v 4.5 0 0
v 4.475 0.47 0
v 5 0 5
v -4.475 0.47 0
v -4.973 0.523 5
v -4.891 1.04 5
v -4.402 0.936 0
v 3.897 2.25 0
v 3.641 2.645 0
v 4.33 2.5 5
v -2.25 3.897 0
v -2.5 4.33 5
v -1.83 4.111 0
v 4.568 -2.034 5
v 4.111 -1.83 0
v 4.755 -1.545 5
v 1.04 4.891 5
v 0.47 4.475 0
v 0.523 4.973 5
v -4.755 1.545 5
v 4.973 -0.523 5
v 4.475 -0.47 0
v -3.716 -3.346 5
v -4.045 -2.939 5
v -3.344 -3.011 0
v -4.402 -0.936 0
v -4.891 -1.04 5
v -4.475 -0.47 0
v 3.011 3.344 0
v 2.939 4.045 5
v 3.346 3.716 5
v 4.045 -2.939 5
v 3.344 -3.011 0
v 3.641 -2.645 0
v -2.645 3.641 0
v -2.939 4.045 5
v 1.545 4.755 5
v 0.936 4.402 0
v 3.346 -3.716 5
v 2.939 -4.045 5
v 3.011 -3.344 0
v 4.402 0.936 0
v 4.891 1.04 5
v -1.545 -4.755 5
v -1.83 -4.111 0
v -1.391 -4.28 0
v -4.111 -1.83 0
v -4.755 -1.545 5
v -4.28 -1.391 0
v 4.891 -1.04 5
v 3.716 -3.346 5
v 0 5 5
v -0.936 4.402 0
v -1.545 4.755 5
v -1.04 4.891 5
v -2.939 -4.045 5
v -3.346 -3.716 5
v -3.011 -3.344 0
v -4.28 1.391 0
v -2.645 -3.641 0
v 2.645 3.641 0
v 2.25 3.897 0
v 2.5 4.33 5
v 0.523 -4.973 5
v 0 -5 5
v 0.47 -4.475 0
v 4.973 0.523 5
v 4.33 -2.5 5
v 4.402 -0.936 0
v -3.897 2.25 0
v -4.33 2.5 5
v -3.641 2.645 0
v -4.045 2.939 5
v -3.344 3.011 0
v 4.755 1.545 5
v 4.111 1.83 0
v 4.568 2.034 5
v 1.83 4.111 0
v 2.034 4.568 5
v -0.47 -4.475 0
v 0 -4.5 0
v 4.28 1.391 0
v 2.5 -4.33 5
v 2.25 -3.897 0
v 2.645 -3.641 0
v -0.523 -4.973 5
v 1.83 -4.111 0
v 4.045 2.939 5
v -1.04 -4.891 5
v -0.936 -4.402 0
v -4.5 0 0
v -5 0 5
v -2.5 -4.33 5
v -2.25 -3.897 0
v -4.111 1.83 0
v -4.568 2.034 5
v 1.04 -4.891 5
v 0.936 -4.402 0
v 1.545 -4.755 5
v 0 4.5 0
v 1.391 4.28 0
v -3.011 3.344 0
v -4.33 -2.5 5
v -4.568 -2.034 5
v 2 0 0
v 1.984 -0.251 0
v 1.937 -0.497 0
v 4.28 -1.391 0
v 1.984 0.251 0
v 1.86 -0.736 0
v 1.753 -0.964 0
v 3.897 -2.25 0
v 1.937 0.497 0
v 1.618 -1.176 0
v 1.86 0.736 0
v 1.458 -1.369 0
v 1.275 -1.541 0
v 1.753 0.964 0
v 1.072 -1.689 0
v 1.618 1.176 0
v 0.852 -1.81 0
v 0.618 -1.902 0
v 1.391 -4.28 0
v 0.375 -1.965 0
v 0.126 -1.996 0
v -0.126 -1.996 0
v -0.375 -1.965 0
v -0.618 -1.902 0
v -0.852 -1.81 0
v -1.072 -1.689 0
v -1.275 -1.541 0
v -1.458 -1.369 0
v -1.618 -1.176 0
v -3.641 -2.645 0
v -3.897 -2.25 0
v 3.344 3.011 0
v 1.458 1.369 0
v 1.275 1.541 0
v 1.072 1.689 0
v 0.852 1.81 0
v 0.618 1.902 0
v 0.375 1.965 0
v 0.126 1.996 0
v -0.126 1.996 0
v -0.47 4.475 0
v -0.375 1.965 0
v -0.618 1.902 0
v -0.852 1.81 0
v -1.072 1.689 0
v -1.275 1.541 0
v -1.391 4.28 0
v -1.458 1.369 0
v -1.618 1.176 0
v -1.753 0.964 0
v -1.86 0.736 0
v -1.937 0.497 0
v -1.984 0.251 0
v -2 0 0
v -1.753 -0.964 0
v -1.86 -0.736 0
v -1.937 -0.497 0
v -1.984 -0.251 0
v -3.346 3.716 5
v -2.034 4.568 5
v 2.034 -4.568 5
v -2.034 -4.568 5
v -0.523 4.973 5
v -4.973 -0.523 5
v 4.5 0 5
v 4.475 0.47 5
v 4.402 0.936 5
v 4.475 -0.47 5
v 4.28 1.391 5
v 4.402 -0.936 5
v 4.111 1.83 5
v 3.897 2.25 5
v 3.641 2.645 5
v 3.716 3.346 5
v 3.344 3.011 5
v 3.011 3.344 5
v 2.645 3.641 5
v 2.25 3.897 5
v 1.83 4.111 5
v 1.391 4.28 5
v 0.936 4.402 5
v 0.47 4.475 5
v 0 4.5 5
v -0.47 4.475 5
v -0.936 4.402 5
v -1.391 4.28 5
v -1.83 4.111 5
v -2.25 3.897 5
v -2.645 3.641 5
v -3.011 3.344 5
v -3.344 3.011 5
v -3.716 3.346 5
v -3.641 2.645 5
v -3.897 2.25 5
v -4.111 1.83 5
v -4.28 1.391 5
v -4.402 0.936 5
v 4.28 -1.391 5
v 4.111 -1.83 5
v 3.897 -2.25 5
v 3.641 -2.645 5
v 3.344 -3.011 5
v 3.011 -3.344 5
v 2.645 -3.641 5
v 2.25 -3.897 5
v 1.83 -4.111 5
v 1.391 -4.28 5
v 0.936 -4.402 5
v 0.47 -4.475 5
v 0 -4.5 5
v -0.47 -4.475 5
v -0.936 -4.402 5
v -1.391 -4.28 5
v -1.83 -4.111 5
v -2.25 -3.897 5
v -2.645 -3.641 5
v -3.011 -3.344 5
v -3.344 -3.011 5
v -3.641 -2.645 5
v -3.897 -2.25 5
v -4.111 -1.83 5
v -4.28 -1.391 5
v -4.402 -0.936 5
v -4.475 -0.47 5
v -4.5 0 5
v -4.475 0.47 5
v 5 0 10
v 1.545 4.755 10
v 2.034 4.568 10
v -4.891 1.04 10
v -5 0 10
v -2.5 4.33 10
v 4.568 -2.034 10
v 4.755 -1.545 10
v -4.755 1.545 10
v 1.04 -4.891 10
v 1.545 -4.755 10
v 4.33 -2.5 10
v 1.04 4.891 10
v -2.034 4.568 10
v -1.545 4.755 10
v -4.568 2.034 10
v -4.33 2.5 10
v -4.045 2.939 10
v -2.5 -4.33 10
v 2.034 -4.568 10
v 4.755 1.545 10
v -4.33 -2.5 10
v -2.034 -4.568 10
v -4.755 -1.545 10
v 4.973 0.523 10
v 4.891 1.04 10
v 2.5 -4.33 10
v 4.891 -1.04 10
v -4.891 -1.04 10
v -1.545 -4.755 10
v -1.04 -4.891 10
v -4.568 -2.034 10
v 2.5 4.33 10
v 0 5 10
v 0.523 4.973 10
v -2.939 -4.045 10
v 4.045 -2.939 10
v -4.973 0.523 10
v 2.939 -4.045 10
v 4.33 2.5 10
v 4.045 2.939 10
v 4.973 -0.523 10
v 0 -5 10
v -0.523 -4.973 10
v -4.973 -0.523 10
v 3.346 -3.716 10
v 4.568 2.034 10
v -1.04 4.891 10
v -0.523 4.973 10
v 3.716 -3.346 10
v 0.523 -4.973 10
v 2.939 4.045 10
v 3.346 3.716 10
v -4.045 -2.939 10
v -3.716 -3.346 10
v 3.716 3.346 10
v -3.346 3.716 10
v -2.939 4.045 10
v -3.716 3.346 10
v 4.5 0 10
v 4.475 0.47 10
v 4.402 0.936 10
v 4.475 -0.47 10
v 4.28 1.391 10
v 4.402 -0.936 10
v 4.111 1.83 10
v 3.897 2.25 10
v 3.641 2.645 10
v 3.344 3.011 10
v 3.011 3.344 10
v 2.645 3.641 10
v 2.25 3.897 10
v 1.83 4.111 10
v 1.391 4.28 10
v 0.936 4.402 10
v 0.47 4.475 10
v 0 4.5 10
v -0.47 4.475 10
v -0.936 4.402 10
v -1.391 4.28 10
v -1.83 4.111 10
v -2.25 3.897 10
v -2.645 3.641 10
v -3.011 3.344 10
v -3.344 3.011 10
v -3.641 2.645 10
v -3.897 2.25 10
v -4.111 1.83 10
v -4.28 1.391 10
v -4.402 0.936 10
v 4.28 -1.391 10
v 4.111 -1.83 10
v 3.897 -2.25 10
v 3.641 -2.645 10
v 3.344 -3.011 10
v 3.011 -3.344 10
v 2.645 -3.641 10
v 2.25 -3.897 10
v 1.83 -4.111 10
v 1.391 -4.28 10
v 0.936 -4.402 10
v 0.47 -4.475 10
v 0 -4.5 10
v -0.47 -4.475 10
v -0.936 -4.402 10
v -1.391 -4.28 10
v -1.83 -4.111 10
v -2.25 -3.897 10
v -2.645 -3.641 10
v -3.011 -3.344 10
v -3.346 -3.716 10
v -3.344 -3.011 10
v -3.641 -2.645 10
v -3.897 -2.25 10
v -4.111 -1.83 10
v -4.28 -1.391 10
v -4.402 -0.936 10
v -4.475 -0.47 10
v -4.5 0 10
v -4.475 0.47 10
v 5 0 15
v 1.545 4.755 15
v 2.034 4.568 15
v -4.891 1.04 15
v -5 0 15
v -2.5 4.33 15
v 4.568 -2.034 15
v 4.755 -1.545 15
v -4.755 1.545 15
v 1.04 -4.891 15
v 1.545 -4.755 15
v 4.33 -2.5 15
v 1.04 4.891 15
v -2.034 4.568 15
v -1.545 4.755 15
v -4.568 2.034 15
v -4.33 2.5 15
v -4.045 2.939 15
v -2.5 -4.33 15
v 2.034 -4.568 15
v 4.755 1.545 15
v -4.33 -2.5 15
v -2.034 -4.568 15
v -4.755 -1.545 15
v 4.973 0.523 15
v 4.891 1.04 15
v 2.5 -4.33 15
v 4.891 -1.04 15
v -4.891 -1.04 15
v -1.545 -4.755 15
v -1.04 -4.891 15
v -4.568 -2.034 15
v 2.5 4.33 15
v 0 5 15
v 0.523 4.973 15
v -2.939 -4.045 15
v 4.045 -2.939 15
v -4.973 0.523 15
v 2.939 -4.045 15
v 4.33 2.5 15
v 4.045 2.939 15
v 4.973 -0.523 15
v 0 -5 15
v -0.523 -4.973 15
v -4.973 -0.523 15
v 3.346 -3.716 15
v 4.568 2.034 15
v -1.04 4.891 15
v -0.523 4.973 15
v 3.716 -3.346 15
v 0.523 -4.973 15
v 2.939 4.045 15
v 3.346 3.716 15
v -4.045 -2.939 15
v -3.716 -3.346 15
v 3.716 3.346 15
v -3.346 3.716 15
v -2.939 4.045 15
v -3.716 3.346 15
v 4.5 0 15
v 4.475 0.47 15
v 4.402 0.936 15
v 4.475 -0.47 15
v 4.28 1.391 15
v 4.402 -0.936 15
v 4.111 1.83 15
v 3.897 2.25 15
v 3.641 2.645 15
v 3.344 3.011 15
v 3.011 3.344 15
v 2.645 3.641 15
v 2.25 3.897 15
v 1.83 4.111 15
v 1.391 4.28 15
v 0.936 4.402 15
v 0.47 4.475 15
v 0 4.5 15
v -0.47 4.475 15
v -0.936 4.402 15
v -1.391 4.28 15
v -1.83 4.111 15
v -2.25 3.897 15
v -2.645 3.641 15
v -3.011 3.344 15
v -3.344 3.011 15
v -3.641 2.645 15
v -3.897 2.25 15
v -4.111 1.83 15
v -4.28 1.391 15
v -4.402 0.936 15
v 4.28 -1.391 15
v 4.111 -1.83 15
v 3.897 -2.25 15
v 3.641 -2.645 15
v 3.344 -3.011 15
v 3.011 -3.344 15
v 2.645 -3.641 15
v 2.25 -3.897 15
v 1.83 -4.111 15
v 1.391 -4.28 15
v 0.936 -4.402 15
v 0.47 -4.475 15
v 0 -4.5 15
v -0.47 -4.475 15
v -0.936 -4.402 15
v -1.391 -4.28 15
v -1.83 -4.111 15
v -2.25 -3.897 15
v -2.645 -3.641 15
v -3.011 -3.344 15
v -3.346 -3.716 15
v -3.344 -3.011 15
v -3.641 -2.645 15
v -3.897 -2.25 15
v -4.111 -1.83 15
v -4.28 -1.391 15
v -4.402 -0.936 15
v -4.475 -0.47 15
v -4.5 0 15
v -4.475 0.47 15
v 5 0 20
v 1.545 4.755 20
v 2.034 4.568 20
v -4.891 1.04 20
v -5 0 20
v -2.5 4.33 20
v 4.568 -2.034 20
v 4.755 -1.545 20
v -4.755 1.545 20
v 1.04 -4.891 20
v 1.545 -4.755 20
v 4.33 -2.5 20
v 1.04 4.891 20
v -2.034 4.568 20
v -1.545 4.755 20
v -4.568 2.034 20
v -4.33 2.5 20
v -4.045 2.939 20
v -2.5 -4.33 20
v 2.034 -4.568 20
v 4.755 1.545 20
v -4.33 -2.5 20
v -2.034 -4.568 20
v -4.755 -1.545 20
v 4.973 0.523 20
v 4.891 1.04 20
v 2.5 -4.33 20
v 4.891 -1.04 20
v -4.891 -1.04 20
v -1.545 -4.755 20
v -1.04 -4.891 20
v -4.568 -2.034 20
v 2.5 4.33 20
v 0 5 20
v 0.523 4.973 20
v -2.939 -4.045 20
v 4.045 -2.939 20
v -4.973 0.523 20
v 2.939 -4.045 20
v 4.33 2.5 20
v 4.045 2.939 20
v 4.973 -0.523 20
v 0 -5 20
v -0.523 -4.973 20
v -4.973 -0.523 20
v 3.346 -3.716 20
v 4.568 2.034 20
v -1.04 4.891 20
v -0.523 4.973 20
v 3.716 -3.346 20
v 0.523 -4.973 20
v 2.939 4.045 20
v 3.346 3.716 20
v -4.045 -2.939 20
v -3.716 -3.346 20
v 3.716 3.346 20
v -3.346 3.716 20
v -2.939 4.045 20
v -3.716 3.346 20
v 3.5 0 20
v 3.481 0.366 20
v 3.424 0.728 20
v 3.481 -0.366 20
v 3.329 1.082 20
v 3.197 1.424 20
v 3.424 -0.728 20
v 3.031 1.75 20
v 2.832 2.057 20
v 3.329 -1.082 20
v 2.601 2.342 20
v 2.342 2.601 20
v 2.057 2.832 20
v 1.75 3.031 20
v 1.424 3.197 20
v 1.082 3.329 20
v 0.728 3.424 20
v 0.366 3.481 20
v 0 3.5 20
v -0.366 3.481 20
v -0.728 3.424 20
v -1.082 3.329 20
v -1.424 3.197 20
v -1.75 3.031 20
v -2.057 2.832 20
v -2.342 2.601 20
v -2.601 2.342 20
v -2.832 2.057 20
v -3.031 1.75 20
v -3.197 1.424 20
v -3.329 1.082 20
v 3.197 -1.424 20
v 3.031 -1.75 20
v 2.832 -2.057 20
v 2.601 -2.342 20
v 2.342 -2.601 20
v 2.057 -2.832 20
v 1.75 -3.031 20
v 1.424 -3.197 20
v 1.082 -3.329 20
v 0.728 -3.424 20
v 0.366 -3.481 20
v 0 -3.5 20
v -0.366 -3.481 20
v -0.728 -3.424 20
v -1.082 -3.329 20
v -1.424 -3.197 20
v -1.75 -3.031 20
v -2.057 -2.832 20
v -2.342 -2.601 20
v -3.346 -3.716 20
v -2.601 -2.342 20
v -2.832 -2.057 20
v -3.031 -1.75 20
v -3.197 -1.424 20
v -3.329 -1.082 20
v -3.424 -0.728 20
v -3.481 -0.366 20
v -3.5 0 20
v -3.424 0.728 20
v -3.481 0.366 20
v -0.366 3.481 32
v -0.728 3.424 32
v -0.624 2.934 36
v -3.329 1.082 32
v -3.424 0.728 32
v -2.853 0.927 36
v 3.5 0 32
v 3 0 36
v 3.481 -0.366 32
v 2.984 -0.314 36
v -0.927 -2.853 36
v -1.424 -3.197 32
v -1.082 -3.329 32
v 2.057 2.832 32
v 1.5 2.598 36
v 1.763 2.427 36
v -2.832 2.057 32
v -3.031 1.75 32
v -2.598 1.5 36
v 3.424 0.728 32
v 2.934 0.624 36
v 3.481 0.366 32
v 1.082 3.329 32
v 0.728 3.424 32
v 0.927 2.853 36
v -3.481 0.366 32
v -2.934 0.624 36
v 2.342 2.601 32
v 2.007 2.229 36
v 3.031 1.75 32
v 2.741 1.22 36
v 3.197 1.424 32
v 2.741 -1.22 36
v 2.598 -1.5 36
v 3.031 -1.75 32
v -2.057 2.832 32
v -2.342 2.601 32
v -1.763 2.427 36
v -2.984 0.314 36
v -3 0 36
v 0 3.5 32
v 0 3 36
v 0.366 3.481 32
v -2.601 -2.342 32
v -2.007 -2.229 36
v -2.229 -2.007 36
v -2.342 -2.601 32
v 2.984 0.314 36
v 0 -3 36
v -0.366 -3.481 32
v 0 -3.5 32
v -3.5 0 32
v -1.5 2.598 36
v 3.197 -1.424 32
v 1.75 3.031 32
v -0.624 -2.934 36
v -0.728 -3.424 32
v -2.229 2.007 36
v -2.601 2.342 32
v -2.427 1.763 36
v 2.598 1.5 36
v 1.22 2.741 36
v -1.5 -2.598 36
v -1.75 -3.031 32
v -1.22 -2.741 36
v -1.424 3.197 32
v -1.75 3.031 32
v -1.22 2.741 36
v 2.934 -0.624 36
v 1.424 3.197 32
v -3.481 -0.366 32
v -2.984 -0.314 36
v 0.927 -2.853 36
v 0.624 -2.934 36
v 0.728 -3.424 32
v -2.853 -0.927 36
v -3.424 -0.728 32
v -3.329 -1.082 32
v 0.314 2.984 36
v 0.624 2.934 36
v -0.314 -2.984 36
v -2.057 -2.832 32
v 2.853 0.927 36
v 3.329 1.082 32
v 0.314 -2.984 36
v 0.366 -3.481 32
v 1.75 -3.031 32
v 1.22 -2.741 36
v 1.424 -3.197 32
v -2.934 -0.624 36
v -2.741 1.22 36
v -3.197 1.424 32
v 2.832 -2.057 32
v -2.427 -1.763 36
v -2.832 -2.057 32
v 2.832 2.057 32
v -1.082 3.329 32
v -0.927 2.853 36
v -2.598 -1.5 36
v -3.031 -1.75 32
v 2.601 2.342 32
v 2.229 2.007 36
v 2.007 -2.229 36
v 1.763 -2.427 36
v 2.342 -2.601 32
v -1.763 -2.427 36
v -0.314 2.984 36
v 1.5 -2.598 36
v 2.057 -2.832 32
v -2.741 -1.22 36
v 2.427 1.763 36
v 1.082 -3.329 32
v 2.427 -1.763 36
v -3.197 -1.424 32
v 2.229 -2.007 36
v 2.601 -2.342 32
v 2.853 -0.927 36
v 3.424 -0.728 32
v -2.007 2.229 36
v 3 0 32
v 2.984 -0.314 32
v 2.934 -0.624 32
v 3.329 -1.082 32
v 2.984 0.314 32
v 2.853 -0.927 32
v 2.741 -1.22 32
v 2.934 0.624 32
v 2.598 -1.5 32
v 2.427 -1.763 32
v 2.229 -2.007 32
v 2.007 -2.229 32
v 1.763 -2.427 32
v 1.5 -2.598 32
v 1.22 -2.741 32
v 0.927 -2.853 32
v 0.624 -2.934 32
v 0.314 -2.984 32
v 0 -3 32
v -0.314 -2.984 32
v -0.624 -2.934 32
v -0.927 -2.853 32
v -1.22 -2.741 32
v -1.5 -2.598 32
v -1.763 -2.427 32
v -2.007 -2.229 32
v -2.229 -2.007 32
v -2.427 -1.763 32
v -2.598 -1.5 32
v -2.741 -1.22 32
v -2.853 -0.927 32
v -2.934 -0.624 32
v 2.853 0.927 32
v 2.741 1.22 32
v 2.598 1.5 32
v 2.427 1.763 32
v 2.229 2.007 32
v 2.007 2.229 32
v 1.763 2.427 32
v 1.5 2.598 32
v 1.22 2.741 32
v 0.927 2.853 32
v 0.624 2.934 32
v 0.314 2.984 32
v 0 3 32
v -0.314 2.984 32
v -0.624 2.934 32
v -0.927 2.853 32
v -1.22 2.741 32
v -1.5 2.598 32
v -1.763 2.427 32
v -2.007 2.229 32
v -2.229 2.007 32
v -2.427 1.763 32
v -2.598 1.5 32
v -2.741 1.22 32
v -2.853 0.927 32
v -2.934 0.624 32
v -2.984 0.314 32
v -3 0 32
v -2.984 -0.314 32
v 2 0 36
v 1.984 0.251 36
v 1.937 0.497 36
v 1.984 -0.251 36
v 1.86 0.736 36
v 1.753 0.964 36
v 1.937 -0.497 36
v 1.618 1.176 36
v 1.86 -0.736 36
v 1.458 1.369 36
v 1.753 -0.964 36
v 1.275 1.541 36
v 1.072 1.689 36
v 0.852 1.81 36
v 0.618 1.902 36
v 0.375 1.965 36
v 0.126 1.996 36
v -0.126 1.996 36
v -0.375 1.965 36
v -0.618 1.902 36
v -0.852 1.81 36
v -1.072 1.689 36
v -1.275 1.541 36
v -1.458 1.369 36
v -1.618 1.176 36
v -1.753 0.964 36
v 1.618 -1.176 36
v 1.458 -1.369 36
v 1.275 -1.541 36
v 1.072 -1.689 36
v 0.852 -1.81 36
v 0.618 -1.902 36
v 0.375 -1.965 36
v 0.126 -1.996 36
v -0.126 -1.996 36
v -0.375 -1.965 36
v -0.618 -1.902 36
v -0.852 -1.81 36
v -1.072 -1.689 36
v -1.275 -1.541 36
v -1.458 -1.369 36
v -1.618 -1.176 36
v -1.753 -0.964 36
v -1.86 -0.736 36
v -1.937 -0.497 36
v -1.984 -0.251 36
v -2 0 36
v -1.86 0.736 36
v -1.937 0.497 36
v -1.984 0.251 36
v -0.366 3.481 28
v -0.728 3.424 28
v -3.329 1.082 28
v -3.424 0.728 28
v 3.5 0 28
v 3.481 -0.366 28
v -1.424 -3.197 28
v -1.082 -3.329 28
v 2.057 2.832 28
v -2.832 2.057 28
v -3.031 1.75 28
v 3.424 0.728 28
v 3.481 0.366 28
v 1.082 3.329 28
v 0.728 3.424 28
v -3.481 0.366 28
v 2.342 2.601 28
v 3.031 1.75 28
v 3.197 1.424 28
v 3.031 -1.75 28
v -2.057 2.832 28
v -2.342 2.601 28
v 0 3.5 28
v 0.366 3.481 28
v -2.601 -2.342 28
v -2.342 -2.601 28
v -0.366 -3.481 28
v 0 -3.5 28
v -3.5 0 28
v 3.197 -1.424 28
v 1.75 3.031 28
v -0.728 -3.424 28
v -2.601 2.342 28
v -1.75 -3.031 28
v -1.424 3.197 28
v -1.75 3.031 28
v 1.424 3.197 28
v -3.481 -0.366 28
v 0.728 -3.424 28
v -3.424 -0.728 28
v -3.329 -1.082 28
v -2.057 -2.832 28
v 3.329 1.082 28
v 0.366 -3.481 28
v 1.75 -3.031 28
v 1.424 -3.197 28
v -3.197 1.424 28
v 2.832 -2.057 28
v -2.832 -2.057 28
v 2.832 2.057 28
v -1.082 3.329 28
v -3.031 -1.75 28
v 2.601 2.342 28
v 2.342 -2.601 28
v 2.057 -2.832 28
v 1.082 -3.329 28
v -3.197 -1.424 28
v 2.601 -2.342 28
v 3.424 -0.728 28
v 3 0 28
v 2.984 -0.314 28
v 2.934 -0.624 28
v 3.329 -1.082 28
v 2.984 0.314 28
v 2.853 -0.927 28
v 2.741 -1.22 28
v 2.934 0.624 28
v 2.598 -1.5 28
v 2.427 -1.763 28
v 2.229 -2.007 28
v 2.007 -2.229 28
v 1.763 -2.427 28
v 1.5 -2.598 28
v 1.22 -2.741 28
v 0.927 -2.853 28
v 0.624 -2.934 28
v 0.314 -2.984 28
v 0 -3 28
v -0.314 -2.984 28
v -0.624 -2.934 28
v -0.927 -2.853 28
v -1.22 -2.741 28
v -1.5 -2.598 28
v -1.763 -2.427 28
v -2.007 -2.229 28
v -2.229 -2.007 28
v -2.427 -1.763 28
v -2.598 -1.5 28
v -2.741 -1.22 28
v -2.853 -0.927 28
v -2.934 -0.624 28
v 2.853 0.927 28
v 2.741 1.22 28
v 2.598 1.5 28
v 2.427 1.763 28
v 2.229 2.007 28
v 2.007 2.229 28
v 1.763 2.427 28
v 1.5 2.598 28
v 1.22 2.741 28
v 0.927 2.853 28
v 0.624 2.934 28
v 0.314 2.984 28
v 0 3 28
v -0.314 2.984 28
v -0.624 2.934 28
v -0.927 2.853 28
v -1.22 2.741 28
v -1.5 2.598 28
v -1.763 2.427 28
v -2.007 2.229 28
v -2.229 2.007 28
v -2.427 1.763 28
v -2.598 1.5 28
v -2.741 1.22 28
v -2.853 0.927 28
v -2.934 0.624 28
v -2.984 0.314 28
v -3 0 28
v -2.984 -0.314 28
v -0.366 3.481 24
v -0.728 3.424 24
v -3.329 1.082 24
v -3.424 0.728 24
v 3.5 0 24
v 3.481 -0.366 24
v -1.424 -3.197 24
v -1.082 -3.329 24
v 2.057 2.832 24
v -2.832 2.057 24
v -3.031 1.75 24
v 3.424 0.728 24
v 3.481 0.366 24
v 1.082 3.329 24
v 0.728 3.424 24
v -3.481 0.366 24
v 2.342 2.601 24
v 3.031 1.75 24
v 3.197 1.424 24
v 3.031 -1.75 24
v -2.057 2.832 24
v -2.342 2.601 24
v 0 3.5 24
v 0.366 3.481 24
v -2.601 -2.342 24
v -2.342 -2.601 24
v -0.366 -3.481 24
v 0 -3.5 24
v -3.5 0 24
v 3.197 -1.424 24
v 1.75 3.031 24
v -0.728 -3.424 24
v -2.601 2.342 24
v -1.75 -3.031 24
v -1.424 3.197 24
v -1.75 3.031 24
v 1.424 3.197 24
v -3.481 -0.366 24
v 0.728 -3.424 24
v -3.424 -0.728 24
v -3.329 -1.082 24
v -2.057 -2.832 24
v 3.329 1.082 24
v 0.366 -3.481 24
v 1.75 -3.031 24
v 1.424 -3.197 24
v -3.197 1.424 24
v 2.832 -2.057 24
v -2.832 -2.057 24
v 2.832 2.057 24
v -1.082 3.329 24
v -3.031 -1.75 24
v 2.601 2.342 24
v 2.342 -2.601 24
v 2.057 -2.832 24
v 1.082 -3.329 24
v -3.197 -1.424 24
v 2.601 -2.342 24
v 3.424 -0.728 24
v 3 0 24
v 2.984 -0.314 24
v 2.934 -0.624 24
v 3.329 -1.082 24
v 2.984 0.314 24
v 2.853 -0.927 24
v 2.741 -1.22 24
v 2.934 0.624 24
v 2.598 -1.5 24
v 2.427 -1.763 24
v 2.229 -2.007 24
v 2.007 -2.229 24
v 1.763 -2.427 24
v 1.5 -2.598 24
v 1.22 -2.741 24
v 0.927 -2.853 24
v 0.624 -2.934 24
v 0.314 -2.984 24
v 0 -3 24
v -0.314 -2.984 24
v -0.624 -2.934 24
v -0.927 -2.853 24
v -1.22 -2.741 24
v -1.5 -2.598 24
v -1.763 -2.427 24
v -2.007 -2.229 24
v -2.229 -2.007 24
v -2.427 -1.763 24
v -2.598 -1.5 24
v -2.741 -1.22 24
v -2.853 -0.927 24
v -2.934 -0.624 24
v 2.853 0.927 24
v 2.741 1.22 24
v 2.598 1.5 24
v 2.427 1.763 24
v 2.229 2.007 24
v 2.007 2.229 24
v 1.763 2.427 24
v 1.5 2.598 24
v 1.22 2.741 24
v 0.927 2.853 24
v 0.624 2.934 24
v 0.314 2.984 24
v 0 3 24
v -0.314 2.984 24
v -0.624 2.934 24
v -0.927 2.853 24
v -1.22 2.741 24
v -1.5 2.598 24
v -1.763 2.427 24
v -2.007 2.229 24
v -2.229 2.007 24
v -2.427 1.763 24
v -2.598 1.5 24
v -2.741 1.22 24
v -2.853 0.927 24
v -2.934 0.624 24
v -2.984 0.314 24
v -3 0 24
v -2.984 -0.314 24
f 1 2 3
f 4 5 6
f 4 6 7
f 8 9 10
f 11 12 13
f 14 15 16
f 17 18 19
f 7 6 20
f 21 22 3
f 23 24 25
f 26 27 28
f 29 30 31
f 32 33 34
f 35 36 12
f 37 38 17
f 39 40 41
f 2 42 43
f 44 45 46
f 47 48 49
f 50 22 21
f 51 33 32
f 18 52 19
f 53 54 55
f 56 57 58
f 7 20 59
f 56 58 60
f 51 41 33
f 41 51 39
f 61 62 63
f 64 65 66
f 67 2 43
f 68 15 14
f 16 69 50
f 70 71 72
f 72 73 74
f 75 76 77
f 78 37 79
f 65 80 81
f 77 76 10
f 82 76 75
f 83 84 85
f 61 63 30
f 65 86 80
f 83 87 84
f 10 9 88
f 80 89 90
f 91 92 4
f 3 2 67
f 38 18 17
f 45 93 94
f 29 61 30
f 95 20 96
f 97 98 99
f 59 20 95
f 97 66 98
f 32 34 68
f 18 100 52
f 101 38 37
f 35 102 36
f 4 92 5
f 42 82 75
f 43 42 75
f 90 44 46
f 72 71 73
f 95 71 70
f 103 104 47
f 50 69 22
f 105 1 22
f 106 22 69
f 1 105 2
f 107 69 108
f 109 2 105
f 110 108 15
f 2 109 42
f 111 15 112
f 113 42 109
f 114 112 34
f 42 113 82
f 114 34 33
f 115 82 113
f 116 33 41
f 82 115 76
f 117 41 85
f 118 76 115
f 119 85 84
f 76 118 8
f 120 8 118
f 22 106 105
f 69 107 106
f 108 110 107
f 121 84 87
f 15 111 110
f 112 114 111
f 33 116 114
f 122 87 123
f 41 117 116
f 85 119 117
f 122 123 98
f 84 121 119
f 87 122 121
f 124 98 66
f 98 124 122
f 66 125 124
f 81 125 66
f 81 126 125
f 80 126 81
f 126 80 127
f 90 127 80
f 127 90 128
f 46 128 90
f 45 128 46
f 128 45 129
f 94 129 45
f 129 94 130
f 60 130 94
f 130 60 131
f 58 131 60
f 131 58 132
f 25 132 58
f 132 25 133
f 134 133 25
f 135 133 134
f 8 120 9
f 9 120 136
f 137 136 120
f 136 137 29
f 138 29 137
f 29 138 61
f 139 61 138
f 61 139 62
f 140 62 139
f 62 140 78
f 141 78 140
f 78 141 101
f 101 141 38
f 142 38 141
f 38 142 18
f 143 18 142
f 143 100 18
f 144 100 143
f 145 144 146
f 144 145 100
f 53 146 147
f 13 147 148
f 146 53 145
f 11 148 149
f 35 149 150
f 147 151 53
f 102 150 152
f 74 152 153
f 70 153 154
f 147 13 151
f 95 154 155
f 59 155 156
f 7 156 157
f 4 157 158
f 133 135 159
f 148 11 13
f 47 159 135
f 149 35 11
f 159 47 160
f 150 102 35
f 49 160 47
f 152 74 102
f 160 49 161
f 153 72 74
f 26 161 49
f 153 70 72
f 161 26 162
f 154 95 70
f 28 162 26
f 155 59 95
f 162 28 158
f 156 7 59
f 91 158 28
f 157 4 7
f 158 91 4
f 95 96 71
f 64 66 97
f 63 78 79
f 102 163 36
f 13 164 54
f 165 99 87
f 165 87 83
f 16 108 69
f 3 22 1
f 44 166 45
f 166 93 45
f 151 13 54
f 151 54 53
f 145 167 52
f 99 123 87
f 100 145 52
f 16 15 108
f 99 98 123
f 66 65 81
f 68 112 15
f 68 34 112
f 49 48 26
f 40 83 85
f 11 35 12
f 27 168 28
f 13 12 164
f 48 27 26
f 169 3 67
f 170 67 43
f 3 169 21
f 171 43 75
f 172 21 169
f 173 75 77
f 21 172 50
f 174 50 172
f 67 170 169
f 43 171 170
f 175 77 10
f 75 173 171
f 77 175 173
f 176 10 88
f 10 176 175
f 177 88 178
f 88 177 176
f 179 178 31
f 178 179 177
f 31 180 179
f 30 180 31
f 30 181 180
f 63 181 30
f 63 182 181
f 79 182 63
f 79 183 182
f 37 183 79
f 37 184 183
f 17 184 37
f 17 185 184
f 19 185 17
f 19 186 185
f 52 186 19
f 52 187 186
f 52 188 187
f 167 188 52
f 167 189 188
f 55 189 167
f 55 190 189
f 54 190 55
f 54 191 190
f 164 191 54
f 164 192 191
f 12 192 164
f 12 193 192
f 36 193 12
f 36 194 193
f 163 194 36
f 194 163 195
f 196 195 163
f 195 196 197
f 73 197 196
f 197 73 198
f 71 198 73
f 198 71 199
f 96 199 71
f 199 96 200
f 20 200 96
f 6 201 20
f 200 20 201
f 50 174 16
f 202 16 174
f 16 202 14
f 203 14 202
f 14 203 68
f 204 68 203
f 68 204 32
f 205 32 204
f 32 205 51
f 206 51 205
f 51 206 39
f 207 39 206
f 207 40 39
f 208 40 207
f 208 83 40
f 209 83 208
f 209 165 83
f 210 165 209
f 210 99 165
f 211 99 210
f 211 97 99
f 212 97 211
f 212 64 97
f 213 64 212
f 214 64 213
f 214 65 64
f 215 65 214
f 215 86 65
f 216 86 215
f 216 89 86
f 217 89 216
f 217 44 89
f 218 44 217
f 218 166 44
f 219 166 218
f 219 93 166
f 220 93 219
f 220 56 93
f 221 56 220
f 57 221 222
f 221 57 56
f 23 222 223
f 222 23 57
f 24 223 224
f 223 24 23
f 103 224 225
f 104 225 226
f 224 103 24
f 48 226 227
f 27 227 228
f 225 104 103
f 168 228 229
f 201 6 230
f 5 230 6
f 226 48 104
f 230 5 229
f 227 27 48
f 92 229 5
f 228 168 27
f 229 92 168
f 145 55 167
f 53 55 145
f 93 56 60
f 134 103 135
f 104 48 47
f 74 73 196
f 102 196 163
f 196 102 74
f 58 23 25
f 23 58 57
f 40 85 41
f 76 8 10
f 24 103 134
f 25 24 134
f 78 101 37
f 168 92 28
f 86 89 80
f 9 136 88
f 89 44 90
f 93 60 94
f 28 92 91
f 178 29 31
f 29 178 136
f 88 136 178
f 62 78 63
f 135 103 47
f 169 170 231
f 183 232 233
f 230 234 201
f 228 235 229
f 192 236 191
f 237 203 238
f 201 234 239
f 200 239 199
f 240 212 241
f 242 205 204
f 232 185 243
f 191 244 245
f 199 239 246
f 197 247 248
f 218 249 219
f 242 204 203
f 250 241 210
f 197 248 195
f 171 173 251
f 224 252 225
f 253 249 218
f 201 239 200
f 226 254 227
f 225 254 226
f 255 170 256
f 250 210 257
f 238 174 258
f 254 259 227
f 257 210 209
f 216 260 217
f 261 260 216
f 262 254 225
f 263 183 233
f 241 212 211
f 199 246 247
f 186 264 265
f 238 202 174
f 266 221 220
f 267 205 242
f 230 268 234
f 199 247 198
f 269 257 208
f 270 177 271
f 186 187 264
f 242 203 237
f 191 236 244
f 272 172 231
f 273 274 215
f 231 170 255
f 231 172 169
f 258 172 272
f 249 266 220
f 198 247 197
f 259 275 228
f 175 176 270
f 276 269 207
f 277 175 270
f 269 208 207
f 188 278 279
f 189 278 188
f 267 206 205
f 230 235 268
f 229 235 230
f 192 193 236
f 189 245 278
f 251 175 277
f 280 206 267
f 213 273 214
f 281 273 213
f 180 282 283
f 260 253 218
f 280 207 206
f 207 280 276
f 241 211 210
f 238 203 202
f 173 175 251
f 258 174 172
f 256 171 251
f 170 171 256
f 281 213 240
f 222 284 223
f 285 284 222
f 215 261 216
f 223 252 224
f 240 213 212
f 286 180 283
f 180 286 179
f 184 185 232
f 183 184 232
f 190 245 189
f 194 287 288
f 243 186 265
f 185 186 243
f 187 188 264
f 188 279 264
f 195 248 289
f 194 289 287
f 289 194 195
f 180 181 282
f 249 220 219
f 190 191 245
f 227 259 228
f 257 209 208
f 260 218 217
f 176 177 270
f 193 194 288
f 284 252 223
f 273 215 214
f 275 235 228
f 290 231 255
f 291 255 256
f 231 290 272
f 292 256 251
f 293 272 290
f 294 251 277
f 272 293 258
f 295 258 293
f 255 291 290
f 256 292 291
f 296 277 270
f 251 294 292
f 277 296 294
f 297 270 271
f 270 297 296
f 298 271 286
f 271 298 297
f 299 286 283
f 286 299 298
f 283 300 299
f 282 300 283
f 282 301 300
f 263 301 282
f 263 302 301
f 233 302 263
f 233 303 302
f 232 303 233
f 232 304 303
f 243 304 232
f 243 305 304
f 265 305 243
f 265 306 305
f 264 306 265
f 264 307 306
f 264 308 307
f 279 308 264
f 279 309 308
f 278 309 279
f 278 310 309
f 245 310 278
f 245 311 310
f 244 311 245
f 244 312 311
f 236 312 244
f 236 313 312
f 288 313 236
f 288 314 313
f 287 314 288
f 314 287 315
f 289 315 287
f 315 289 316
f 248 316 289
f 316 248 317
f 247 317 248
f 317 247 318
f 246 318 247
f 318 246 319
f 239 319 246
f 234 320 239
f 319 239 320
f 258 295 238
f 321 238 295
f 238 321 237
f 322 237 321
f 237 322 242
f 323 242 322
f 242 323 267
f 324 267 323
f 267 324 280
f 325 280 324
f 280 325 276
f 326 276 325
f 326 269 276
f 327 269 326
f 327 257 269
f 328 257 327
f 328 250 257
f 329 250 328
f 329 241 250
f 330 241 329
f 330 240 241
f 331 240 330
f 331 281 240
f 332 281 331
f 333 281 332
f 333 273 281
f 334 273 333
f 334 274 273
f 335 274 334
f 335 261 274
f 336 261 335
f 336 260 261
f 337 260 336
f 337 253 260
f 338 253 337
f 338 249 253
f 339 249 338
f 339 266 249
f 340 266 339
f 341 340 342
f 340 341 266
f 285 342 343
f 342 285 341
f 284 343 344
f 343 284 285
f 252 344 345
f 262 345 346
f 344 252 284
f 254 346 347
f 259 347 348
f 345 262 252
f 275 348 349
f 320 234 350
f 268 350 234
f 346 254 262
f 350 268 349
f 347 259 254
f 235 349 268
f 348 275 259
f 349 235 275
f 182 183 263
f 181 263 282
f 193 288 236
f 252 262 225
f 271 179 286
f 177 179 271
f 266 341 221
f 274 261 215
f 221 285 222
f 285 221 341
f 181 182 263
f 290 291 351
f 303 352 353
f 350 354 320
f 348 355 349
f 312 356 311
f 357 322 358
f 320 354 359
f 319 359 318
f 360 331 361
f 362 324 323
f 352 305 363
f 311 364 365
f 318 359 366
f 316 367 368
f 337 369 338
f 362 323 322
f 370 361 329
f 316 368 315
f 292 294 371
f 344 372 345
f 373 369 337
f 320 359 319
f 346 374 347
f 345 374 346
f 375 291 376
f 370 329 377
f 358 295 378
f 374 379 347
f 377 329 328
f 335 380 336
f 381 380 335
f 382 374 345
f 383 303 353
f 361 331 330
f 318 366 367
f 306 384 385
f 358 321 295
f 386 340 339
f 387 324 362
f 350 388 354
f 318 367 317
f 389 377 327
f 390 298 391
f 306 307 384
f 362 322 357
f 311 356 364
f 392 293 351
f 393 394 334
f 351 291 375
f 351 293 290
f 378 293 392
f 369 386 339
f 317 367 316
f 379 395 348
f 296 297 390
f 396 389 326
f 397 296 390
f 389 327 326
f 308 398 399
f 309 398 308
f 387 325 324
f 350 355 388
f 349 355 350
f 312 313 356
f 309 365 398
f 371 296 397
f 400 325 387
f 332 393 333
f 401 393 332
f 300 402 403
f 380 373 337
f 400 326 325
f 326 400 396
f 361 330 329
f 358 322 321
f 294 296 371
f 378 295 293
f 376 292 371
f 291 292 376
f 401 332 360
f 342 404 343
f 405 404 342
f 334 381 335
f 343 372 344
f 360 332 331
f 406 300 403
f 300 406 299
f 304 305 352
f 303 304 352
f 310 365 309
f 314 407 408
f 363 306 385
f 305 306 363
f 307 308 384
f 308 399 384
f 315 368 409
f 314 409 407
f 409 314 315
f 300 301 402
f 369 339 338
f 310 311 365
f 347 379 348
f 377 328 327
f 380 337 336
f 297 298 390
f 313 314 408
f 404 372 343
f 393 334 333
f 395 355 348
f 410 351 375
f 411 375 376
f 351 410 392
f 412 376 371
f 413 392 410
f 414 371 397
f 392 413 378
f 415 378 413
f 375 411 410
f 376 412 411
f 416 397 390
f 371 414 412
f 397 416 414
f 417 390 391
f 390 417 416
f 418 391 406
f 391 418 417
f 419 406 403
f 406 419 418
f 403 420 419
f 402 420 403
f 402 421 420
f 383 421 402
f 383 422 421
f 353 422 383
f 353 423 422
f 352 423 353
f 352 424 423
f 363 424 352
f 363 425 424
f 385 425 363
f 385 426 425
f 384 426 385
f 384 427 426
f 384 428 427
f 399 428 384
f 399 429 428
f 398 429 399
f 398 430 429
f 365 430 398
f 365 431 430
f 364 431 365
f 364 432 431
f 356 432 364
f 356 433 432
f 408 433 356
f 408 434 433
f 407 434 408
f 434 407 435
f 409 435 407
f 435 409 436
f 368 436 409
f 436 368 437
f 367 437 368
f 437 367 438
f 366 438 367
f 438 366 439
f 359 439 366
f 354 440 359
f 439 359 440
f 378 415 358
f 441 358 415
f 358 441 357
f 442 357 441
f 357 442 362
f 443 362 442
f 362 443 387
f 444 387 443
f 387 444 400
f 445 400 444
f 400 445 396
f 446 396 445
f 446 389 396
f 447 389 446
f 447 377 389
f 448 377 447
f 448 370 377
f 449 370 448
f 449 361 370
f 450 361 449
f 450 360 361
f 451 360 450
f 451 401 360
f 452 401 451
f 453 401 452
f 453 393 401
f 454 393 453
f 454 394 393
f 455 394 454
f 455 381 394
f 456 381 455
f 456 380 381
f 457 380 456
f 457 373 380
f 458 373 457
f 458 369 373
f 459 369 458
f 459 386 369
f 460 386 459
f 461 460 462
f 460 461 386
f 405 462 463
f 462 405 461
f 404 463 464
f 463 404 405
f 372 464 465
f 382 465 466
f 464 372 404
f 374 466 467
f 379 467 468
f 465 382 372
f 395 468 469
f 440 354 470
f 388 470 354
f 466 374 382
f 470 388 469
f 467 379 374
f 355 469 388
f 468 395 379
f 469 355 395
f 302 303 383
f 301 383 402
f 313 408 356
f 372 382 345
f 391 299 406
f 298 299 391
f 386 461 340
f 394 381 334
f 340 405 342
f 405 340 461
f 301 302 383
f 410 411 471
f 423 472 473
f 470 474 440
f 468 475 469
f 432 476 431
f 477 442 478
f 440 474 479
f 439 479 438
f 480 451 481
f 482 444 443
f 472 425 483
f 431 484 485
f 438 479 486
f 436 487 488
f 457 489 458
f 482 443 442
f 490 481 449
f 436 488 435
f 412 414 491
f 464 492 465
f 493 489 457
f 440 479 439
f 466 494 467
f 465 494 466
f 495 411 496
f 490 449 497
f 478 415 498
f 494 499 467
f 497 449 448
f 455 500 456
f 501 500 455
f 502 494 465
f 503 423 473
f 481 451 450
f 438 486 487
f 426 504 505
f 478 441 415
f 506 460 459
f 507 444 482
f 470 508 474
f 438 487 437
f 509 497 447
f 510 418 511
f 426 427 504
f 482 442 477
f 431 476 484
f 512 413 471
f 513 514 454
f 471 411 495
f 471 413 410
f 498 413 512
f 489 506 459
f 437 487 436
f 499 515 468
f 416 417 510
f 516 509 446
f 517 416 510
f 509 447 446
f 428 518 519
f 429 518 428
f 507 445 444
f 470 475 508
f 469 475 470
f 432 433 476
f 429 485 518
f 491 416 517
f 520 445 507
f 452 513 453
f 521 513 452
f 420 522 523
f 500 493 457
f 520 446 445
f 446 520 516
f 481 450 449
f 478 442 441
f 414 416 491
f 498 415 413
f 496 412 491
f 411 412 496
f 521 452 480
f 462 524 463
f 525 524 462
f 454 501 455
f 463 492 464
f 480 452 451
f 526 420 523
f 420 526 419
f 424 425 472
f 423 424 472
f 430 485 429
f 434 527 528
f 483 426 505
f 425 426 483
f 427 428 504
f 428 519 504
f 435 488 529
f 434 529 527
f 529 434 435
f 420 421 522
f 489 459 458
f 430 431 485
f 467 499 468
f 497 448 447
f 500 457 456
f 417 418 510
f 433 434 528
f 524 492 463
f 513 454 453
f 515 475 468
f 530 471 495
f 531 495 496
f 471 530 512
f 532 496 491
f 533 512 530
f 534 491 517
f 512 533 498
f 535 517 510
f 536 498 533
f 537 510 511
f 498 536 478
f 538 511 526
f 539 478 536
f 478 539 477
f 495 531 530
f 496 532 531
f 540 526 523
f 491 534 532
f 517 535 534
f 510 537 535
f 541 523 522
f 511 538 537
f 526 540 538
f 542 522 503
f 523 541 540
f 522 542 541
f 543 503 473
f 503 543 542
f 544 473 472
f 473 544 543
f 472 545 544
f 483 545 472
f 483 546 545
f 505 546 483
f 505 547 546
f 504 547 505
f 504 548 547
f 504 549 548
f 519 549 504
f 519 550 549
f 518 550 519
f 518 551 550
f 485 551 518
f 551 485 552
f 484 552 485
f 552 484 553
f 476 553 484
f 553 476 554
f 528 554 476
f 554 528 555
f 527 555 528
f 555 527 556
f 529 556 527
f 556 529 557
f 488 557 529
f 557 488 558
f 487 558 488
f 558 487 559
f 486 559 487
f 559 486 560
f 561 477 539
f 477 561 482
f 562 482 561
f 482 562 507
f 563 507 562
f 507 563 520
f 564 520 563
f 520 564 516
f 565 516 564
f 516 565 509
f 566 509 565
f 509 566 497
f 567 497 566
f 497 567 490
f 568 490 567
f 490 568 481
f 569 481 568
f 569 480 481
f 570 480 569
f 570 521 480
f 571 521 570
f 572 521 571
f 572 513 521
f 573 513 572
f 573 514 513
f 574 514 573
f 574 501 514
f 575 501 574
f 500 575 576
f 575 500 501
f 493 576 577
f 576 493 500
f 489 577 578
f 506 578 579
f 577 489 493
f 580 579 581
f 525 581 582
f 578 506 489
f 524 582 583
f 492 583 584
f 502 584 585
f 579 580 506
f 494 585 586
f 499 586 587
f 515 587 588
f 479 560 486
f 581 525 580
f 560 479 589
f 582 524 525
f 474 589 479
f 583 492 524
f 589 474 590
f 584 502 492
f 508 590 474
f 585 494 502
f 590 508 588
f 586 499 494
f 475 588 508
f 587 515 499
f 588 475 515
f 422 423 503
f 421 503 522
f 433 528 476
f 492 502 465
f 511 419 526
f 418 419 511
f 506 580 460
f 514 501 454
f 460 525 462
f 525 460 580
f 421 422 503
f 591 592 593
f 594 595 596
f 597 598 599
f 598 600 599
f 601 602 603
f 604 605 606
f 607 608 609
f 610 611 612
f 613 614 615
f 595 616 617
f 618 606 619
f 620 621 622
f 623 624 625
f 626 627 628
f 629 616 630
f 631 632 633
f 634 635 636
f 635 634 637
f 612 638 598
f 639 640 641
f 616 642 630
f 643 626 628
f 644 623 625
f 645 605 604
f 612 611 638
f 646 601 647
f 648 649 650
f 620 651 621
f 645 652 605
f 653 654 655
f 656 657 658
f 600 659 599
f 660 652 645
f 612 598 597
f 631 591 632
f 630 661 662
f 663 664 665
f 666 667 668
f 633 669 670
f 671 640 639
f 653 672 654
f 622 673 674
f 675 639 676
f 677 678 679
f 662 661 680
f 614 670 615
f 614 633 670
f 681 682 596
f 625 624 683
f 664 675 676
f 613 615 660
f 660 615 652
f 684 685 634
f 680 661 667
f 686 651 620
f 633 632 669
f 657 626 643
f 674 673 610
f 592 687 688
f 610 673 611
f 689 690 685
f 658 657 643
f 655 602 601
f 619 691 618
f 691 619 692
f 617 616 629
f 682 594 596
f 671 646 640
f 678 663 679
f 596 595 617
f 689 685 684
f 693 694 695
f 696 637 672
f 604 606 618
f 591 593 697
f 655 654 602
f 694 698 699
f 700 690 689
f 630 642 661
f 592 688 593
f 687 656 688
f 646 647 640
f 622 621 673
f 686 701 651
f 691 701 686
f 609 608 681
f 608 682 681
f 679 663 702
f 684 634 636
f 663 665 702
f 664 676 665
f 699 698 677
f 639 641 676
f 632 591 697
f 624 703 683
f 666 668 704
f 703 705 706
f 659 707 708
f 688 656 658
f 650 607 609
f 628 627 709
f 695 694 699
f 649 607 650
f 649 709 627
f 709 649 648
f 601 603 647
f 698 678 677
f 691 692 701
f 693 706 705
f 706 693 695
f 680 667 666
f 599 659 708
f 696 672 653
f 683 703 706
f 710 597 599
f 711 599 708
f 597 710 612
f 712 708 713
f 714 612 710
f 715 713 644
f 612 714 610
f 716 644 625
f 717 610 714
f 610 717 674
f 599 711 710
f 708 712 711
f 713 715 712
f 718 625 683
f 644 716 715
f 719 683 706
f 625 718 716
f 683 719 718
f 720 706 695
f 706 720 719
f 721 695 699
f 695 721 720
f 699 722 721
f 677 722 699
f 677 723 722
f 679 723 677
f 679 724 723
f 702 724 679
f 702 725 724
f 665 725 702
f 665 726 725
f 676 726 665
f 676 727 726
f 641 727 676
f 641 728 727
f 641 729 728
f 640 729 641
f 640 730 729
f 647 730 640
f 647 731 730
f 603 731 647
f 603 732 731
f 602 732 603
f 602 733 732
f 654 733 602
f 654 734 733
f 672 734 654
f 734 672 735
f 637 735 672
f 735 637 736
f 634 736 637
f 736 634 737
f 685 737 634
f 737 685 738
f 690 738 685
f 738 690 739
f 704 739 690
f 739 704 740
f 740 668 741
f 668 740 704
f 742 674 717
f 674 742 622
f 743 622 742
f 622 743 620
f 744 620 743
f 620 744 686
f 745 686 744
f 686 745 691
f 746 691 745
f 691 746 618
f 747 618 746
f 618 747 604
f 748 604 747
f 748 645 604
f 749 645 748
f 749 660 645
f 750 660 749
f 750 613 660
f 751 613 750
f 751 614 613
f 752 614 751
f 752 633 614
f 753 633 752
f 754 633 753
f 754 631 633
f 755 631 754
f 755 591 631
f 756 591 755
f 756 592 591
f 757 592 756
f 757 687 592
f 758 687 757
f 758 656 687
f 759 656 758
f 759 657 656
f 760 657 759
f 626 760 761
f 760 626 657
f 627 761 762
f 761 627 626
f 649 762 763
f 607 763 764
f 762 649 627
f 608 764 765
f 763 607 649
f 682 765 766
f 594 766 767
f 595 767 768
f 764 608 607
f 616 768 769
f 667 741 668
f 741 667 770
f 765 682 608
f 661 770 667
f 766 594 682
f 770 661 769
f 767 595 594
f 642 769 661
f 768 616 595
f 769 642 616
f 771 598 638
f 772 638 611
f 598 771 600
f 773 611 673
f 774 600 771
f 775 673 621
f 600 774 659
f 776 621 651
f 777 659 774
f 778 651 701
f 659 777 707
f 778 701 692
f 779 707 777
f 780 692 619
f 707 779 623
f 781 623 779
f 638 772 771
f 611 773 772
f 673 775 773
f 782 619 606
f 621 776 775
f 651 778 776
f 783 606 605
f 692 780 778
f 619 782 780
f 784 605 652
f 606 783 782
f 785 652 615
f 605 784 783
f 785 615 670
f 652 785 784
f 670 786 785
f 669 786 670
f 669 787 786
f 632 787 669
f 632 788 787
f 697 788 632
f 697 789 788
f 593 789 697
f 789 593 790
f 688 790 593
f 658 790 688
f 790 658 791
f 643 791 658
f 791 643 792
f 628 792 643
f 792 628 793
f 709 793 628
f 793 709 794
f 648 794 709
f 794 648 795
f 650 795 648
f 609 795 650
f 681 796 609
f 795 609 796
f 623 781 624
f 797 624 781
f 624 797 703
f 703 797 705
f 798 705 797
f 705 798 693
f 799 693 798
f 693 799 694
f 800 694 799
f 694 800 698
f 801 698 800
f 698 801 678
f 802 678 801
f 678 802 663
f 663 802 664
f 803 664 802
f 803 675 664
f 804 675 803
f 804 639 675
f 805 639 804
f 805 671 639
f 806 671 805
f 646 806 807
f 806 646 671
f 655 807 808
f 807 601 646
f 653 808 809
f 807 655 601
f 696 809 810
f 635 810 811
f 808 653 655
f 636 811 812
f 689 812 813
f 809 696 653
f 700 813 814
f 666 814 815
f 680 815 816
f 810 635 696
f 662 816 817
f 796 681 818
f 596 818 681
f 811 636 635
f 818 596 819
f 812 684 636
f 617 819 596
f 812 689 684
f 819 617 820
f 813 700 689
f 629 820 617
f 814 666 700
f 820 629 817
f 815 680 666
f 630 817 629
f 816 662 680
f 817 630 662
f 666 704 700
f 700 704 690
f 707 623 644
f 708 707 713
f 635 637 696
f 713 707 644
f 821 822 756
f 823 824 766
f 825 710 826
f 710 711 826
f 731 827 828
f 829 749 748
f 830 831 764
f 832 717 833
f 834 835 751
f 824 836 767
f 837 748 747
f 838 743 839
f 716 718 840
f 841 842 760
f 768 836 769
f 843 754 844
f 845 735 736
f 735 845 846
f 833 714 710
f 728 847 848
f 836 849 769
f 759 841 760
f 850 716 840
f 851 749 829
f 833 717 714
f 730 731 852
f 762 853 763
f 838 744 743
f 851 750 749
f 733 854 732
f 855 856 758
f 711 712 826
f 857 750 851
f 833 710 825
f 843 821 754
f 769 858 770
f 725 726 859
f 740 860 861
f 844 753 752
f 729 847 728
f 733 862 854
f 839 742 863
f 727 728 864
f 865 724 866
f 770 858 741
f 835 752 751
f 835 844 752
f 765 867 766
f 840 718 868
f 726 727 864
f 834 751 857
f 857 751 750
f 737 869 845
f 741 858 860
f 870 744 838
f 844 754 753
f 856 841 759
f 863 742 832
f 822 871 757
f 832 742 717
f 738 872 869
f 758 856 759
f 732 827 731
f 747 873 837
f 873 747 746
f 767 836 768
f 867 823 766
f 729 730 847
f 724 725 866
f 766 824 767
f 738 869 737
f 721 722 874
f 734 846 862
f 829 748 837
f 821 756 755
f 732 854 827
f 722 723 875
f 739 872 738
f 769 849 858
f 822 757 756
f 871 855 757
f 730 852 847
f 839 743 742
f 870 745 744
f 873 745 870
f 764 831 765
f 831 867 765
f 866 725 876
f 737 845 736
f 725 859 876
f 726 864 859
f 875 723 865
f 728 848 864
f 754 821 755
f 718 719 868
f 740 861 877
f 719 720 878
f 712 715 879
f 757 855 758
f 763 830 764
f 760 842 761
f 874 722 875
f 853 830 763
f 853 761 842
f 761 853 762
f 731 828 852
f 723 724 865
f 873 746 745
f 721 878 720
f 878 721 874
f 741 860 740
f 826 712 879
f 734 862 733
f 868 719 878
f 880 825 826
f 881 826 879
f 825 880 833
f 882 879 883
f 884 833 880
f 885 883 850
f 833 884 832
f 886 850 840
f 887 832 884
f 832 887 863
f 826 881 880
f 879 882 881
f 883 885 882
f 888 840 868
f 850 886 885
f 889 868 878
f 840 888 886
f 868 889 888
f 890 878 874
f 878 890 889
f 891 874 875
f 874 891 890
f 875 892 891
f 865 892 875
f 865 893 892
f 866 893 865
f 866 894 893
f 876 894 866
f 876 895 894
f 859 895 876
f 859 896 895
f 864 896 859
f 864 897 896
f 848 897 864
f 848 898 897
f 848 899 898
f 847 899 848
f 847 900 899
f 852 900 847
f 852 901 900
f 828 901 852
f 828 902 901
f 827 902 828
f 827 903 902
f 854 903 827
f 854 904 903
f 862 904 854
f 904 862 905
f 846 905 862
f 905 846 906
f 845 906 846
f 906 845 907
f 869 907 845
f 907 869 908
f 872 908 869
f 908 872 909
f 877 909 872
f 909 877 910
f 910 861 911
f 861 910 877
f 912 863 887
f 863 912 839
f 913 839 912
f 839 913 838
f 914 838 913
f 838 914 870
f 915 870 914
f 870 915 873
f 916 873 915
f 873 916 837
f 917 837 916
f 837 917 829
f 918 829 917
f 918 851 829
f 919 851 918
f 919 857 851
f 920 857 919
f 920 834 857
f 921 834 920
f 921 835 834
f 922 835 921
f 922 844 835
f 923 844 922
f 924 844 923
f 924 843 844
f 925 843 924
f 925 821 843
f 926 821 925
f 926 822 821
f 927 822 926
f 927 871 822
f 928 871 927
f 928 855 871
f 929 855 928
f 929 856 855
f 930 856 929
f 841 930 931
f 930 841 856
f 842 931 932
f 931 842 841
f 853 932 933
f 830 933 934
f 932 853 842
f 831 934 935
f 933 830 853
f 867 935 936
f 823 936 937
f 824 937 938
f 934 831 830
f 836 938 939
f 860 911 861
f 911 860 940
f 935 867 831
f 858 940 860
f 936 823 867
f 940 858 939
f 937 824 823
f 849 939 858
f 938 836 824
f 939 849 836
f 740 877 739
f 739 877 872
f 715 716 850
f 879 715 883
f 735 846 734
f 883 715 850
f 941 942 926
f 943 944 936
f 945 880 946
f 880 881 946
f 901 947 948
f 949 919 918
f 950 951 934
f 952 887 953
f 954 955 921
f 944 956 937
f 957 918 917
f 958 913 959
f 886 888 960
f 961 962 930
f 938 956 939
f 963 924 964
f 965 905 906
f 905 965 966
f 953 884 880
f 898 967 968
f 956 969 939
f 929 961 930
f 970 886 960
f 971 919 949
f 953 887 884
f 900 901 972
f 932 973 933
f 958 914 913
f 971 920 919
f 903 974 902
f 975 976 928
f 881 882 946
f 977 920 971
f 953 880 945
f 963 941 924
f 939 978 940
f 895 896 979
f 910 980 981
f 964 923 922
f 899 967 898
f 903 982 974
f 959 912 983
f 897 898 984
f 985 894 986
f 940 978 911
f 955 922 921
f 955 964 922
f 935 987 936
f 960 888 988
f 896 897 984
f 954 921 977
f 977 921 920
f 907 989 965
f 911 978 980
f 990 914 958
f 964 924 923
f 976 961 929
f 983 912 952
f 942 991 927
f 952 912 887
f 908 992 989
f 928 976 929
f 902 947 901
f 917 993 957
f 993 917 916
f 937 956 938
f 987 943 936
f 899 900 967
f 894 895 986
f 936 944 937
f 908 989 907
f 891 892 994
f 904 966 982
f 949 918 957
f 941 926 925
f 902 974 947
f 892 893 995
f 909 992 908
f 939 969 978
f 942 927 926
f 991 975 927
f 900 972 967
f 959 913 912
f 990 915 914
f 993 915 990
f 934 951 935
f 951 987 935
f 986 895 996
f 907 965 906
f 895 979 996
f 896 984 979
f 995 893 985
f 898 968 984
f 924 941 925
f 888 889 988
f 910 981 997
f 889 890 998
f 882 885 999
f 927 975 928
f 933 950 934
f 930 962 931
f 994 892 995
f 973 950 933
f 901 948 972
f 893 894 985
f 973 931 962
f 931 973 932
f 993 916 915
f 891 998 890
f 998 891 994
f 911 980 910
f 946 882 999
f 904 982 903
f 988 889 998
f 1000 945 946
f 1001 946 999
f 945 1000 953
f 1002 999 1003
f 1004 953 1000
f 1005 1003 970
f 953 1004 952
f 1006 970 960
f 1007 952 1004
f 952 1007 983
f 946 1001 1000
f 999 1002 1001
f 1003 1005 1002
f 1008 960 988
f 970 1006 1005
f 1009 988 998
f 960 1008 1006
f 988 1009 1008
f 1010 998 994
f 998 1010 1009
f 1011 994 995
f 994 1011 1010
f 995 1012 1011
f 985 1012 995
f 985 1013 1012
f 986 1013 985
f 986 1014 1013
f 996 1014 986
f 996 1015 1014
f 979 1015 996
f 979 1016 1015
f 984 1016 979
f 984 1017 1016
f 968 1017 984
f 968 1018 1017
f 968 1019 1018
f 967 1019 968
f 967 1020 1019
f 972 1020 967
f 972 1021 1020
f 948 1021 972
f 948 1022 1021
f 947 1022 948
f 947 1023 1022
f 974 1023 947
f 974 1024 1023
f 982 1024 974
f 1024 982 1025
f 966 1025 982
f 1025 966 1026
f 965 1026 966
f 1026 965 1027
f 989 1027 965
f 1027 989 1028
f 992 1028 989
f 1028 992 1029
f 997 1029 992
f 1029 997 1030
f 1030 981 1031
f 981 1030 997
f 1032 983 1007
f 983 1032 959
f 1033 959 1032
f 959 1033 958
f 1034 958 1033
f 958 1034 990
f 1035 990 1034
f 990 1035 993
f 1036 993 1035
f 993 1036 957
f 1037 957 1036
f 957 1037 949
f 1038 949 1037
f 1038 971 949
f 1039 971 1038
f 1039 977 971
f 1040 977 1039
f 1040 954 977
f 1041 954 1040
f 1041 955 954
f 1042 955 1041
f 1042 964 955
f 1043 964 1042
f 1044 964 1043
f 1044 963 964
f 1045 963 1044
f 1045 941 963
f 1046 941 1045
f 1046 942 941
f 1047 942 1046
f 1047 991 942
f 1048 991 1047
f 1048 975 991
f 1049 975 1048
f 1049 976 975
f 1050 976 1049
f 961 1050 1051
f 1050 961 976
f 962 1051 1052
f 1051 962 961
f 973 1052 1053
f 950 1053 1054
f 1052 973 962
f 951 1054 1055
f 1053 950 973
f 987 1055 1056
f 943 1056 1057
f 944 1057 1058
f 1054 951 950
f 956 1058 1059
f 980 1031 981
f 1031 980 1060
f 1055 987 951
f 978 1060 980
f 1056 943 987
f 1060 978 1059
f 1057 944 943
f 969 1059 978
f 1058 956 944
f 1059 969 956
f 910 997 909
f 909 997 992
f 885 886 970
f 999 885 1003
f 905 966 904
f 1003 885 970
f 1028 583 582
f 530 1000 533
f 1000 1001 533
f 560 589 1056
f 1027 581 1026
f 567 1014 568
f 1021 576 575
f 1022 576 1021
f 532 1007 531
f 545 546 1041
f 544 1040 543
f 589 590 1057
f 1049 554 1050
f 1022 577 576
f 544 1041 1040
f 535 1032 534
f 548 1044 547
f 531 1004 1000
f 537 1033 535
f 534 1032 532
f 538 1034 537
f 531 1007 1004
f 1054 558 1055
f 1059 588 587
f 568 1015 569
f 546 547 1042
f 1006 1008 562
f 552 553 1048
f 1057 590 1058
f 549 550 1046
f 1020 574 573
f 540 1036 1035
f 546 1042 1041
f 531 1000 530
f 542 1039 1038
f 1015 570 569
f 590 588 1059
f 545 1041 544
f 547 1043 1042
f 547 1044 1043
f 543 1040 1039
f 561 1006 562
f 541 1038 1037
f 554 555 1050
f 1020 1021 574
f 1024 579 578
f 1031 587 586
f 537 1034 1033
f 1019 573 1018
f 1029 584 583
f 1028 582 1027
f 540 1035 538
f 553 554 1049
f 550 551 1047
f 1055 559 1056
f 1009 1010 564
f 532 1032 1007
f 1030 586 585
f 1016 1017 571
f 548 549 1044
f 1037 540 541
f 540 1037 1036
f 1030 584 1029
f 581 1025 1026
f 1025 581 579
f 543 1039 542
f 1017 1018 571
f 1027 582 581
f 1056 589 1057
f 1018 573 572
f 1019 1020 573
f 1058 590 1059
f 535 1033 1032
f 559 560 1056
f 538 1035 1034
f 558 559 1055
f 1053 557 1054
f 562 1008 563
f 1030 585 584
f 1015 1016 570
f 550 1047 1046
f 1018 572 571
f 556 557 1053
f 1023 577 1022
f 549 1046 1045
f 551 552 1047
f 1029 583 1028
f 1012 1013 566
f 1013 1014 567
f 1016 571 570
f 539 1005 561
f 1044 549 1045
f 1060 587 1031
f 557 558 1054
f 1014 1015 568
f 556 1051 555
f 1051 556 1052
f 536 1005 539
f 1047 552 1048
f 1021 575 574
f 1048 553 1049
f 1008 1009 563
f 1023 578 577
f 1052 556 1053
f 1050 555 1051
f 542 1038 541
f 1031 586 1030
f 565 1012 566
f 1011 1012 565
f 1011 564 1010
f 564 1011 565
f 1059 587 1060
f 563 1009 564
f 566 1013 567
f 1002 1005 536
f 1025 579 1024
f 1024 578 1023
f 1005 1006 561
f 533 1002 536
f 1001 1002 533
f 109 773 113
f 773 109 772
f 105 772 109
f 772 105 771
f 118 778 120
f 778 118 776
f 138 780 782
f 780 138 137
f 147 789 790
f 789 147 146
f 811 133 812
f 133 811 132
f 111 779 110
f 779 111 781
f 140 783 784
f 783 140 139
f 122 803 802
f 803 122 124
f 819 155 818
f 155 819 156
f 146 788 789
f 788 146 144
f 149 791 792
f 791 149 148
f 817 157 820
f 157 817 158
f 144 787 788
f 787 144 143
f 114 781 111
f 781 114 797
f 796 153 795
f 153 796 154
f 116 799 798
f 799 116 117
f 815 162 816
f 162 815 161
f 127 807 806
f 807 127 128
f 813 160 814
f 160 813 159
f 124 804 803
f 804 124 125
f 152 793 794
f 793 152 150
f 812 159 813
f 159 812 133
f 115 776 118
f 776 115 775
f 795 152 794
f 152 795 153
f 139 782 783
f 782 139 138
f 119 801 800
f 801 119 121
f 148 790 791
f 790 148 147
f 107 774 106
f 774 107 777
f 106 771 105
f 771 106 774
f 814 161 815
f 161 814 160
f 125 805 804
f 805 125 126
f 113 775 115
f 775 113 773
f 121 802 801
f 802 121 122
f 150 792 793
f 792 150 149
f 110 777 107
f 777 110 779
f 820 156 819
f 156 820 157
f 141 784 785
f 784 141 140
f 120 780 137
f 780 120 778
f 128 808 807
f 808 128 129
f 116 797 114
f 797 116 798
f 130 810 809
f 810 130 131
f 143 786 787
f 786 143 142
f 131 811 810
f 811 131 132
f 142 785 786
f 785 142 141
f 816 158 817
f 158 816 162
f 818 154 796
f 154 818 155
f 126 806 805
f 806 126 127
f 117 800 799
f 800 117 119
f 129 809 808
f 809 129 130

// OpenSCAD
stepCount = 4;
stepDiamIncrease = 1;

tubeAdapter(6, 16, 9, 20);

module tubeAdapter(smallExtDiam, smallLength, bigExtDiam, bigLength) {
  difference() {
    union() {
      oneSide(bigExtDiam, bigLength);
      translate([0, 0, smallLength + bigLength]) {
        rotate([180, 0, 0]) {
        color("red")
          oneSide(smallExtDiam, smallLength);
        }
      }
    }
    translate([0, 0, -1])
      cylinder(d = smallExtDiam - 2, h=smallLength + bigLength + 2, $fn=50);
  }
}

module oneSide(diam, length) {
  stepZ = length/stepCount;
  for (step = [0 : stepCount - 1]) {
    translate([0, 0, step * stepZ]) {
      cylinder(d1 = diam, d2 = diam + stepDiamIncrease, h = stepZ, $fn=60);
    }
  }

}
